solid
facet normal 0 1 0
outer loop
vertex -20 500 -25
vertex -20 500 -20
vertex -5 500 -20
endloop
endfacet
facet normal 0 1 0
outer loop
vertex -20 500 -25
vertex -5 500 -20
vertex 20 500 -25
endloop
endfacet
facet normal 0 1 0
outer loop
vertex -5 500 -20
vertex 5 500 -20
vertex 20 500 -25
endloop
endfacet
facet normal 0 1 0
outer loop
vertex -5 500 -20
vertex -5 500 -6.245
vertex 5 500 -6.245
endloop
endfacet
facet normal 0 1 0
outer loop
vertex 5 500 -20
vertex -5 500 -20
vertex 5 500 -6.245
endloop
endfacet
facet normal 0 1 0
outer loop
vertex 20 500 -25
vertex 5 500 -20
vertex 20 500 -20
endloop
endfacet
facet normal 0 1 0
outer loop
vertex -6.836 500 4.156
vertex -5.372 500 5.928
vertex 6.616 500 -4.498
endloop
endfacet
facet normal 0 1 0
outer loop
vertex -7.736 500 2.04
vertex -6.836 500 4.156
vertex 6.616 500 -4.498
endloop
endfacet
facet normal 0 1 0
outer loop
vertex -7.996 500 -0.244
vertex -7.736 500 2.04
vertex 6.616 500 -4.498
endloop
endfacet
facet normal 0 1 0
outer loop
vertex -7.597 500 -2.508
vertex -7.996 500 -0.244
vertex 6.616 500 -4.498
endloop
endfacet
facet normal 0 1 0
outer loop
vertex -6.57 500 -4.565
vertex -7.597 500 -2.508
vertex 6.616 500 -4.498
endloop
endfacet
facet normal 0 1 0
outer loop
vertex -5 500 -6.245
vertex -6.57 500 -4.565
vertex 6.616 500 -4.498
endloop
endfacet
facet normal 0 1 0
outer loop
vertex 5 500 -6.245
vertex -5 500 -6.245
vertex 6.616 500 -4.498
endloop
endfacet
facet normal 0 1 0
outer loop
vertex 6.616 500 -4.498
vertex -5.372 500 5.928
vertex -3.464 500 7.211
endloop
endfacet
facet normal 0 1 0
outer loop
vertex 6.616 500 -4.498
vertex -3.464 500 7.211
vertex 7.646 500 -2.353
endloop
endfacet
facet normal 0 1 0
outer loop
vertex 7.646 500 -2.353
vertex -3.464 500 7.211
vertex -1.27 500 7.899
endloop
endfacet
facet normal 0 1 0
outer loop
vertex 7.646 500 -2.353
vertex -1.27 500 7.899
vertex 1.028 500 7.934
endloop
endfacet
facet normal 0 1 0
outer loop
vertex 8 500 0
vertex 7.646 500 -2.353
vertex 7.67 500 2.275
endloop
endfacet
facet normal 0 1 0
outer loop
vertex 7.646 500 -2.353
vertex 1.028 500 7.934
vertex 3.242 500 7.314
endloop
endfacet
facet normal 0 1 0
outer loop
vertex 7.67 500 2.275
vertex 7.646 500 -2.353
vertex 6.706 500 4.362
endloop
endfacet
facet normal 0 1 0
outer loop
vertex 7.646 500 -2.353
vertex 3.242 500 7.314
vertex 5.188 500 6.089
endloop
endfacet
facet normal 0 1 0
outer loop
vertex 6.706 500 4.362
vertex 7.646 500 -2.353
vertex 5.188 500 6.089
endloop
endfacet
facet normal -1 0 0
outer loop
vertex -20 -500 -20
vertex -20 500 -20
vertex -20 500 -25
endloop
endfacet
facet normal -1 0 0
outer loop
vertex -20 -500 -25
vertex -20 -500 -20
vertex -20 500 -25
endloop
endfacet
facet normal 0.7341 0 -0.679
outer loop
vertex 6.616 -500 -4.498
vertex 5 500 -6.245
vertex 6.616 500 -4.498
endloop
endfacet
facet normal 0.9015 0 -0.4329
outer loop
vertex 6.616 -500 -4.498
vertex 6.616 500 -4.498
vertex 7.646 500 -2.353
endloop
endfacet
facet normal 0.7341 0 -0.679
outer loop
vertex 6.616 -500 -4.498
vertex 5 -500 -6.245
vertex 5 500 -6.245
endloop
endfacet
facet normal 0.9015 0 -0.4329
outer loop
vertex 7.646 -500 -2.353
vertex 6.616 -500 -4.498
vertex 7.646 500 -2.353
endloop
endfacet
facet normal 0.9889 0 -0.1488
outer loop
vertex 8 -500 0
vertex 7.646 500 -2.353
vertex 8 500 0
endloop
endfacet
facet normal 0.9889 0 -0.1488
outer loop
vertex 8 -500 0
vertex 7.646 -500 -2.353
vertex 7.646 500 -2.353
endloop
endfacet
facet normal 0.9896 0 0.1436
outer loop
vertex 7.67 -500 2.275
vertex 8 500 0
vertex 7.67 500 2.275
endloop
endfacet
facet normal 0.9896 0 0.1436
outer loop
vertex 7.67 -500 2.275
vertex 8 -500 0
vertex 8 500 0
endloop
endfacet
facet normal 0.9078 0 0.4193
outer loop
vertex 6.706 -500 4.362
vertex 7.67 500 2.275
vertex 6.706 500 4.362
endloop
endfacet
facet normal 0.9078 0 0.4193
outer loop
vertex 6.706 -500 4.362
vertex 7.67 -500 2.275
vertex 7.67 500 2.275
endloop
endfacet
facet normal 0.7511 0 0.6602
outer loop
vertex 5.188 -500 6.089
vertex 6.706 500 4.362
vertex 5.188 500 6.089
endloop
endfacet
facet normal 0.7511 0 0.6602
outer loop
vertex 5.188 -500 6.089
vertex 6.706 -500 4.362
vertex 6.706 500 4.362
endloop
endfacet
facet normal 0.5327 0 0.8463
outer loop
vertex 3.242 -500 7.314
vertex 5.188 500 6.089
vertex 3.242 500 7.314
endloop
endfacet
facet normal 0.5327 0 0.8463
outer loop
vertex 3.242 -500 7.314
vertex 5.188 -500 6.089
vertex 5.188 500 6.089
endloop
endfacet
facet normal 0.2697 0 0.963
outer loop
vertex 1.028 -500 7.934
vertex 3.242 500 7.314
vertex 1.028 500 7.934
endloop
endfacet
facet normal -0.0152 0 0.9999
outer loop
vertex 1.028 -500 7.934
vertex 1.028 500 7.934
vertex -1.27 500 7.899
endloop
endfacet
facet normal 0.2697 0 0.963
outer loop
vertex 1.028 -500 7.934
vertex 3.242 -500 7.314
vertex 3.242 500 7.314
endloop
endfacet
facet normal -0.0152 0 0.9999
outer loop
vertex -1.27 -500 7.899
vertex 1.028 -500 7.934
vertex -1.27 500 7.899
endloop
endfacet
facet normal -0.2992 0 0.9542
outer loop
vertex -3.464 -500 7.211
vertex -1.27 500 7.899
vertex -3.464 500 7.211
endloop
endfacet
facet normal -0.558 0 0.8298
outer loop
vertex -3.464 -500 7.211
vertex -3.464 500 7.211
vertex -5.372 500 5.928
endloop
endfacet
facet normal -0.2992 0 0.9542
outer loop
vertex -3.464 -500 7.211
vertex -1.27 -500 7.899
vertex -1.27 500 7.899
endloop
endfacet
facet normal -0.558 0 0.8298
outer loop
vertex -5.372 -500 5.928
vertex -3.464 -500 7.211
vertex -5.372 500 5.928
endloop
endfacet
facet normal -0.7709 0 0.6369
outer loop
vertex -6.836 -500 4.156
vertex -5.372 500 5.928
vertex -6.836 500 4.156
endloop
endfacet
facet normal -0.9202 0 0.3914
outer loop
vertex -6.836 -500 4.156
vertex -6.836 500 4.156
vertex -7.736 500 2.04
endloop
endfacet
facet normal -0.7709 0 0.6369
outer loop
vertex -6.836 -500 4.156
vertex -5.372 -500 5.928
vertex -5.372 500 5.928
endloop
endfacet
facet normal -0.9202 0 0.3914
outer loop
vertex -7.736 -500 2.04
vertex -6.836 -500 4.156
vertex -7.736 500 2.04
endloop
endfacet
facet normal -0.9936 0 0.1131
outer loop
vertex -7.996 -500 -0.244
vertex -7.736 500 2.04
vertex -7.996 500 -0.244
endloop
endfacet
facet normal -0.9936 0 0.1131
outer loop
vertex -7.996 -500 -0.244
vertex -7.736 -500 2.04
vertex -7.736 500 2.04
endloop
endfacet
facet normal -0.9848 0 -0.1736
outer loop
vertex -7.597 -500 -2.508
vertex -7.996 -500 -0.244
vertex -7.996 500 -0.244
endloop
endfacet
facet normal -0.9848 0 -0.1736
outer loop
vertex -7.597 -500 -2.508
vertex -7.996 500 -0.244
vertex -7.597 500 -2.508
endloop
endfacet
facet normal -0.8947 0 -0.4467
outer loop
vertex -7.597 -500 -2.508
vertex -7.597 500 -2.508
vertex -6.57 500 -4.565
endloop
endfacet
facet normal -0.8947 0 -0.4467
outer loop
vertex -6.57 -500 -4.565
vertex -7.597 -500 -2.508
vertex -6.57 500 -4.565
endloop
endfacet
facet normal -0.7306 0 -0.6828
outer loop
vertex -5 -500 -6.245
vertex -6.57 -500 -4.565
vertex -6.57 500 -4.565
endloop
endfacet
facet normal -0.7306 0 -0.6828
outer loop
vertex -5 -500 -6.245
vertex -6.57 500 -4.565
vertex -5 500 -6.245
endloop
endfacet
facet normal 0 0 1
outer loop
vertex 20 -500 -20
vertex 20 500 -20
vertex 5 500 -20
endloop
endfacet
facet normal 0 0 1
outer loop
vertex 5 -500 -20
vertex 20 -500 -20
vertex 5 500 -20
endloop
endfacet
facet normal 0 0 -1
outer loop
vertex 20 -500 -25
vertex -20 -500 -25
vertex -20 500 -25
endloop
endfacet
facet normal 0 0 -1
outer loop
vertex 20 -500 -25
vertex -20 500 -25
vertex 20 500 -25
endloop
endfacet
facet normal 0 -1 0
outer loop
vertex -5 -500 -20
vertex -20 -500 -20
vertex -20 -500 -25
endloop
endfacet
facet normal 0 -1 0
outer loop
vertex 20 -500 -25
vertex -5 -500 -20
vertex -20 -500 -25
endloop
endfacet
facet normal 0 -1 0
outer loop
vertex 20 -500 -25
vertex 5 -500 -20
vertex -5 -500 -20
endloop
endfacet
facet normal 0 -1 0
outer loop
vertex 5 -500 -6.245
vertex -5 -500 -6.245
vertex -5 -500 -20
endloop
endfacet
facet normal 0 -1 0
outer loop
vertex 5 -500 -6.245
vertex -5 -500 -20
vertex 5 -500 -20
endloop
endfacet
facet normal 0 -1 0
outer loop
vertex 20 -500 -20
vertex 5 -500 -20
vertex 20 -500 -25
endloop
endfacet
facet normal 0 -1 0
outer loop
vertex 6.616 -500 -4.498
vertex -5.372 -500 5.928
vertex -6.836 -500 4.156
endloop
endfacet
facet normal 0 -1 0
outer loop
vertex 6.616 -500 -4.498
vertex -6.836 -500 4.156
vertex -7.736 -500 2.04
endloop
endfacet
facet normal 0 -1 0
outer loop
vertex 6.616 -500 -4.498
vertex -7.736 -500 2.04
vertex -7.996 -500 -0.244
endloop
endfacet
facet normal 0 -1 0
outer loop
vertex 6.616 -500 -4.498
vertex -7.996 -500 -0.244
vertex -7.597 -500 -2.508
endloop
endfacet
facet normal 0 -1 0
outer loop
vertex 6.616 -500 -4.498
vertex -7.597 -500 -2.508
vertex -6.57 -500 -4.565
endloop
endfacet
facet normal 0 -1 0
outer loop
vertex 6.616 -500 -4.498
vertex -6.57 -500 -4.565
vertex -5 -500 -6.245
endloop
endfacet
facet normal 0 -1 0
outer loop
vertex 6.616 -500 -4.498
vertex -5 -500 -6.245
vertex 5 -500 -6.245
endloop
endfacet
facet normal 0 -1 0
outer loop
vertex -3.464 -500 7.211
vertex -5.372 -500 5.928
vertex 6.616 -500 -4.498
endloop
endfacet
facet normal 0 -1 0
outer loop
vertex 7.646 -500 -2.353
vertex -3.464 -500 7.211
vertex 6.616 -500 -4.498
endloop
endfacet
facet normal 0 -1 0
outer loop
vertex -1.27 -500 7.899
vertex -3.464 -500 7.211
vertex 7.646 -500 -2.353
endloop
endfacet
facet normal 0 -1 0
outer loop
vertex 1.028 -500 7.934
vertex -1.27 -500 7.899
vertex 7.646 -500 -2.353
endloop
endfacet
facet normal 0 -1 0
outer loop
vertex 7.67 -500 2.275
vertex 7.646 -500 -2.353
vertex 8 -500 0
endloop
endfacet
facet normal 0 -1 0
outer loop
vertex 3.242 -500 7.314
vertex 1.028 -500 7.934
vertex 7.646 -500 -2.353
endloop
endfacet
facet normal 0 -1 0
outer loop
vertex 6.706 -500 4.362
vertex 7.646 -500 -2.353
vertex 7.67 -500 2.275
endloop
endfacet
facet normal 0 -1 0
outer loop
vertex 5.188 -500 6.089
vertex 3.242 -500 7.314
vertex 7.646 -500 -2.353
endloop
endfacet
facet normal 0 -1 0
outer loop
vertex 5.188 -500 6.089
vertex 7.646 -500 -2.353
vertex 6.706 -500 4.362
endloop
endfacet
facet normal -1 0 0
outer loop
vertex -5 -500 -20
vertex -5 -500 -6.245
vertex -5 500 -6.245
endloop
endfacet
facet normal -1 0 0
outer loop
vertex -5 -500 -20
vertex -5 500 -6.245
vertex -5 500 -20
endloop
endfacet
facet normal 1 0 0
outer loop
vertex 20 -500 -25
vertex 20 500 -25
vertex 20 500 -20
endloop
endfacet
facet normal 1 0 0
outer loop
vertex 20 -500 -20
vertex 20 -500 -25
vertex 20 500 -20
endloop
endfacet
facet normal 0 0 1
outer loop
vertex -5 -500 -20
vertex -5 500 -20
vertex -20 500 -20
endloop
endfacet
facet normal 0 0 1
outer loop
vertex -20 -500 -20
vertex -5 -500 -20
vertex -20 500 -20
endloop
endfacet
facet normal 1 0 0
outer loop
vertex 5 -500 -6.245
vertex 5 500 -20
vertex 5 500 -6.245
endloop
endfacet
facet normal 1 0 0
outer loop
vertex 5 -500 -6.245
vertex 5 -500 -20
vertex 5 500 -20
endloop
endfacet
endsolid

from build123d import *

# Parameters (mm, degrees)
F1_DEPTH = 500


with BuildPart() as f1:
    # F0 (on Front) → F1 (new body, symmetric)
    with BuildSketch(Plane.XZ):
        with BuildLine():
            ThreePointArc((5, -6.2449979984), (7.2111025509, -3.4641016151), (8, 0))
            ThreePointArc((8, 0), (-3.4641016151, 7.2111025509), (-5, -6.2449979984))
            ThreePointArc((-5, -6.2449979984), (0, -8), (5, -6.2449979984))
        make_face()
        Polygon((5, -20), (-5, -20), (-20, -20), (-20, -25), (0, -25), (20, -25), (20, -20), align=None)
        with BuildLine():
            ThreePointArc((5, -6.2449979984), (0, -8), (-5, -6.2449979984))
            Line((-5, -6.2449979984), (-5, -20))
            Line((-5, -20), (5, -20))
            Line((5, -20), (5, -6.2449979984))
        make_face()
    extrude(amount=F1_DEPTH, both=True)


solid = f1.part
